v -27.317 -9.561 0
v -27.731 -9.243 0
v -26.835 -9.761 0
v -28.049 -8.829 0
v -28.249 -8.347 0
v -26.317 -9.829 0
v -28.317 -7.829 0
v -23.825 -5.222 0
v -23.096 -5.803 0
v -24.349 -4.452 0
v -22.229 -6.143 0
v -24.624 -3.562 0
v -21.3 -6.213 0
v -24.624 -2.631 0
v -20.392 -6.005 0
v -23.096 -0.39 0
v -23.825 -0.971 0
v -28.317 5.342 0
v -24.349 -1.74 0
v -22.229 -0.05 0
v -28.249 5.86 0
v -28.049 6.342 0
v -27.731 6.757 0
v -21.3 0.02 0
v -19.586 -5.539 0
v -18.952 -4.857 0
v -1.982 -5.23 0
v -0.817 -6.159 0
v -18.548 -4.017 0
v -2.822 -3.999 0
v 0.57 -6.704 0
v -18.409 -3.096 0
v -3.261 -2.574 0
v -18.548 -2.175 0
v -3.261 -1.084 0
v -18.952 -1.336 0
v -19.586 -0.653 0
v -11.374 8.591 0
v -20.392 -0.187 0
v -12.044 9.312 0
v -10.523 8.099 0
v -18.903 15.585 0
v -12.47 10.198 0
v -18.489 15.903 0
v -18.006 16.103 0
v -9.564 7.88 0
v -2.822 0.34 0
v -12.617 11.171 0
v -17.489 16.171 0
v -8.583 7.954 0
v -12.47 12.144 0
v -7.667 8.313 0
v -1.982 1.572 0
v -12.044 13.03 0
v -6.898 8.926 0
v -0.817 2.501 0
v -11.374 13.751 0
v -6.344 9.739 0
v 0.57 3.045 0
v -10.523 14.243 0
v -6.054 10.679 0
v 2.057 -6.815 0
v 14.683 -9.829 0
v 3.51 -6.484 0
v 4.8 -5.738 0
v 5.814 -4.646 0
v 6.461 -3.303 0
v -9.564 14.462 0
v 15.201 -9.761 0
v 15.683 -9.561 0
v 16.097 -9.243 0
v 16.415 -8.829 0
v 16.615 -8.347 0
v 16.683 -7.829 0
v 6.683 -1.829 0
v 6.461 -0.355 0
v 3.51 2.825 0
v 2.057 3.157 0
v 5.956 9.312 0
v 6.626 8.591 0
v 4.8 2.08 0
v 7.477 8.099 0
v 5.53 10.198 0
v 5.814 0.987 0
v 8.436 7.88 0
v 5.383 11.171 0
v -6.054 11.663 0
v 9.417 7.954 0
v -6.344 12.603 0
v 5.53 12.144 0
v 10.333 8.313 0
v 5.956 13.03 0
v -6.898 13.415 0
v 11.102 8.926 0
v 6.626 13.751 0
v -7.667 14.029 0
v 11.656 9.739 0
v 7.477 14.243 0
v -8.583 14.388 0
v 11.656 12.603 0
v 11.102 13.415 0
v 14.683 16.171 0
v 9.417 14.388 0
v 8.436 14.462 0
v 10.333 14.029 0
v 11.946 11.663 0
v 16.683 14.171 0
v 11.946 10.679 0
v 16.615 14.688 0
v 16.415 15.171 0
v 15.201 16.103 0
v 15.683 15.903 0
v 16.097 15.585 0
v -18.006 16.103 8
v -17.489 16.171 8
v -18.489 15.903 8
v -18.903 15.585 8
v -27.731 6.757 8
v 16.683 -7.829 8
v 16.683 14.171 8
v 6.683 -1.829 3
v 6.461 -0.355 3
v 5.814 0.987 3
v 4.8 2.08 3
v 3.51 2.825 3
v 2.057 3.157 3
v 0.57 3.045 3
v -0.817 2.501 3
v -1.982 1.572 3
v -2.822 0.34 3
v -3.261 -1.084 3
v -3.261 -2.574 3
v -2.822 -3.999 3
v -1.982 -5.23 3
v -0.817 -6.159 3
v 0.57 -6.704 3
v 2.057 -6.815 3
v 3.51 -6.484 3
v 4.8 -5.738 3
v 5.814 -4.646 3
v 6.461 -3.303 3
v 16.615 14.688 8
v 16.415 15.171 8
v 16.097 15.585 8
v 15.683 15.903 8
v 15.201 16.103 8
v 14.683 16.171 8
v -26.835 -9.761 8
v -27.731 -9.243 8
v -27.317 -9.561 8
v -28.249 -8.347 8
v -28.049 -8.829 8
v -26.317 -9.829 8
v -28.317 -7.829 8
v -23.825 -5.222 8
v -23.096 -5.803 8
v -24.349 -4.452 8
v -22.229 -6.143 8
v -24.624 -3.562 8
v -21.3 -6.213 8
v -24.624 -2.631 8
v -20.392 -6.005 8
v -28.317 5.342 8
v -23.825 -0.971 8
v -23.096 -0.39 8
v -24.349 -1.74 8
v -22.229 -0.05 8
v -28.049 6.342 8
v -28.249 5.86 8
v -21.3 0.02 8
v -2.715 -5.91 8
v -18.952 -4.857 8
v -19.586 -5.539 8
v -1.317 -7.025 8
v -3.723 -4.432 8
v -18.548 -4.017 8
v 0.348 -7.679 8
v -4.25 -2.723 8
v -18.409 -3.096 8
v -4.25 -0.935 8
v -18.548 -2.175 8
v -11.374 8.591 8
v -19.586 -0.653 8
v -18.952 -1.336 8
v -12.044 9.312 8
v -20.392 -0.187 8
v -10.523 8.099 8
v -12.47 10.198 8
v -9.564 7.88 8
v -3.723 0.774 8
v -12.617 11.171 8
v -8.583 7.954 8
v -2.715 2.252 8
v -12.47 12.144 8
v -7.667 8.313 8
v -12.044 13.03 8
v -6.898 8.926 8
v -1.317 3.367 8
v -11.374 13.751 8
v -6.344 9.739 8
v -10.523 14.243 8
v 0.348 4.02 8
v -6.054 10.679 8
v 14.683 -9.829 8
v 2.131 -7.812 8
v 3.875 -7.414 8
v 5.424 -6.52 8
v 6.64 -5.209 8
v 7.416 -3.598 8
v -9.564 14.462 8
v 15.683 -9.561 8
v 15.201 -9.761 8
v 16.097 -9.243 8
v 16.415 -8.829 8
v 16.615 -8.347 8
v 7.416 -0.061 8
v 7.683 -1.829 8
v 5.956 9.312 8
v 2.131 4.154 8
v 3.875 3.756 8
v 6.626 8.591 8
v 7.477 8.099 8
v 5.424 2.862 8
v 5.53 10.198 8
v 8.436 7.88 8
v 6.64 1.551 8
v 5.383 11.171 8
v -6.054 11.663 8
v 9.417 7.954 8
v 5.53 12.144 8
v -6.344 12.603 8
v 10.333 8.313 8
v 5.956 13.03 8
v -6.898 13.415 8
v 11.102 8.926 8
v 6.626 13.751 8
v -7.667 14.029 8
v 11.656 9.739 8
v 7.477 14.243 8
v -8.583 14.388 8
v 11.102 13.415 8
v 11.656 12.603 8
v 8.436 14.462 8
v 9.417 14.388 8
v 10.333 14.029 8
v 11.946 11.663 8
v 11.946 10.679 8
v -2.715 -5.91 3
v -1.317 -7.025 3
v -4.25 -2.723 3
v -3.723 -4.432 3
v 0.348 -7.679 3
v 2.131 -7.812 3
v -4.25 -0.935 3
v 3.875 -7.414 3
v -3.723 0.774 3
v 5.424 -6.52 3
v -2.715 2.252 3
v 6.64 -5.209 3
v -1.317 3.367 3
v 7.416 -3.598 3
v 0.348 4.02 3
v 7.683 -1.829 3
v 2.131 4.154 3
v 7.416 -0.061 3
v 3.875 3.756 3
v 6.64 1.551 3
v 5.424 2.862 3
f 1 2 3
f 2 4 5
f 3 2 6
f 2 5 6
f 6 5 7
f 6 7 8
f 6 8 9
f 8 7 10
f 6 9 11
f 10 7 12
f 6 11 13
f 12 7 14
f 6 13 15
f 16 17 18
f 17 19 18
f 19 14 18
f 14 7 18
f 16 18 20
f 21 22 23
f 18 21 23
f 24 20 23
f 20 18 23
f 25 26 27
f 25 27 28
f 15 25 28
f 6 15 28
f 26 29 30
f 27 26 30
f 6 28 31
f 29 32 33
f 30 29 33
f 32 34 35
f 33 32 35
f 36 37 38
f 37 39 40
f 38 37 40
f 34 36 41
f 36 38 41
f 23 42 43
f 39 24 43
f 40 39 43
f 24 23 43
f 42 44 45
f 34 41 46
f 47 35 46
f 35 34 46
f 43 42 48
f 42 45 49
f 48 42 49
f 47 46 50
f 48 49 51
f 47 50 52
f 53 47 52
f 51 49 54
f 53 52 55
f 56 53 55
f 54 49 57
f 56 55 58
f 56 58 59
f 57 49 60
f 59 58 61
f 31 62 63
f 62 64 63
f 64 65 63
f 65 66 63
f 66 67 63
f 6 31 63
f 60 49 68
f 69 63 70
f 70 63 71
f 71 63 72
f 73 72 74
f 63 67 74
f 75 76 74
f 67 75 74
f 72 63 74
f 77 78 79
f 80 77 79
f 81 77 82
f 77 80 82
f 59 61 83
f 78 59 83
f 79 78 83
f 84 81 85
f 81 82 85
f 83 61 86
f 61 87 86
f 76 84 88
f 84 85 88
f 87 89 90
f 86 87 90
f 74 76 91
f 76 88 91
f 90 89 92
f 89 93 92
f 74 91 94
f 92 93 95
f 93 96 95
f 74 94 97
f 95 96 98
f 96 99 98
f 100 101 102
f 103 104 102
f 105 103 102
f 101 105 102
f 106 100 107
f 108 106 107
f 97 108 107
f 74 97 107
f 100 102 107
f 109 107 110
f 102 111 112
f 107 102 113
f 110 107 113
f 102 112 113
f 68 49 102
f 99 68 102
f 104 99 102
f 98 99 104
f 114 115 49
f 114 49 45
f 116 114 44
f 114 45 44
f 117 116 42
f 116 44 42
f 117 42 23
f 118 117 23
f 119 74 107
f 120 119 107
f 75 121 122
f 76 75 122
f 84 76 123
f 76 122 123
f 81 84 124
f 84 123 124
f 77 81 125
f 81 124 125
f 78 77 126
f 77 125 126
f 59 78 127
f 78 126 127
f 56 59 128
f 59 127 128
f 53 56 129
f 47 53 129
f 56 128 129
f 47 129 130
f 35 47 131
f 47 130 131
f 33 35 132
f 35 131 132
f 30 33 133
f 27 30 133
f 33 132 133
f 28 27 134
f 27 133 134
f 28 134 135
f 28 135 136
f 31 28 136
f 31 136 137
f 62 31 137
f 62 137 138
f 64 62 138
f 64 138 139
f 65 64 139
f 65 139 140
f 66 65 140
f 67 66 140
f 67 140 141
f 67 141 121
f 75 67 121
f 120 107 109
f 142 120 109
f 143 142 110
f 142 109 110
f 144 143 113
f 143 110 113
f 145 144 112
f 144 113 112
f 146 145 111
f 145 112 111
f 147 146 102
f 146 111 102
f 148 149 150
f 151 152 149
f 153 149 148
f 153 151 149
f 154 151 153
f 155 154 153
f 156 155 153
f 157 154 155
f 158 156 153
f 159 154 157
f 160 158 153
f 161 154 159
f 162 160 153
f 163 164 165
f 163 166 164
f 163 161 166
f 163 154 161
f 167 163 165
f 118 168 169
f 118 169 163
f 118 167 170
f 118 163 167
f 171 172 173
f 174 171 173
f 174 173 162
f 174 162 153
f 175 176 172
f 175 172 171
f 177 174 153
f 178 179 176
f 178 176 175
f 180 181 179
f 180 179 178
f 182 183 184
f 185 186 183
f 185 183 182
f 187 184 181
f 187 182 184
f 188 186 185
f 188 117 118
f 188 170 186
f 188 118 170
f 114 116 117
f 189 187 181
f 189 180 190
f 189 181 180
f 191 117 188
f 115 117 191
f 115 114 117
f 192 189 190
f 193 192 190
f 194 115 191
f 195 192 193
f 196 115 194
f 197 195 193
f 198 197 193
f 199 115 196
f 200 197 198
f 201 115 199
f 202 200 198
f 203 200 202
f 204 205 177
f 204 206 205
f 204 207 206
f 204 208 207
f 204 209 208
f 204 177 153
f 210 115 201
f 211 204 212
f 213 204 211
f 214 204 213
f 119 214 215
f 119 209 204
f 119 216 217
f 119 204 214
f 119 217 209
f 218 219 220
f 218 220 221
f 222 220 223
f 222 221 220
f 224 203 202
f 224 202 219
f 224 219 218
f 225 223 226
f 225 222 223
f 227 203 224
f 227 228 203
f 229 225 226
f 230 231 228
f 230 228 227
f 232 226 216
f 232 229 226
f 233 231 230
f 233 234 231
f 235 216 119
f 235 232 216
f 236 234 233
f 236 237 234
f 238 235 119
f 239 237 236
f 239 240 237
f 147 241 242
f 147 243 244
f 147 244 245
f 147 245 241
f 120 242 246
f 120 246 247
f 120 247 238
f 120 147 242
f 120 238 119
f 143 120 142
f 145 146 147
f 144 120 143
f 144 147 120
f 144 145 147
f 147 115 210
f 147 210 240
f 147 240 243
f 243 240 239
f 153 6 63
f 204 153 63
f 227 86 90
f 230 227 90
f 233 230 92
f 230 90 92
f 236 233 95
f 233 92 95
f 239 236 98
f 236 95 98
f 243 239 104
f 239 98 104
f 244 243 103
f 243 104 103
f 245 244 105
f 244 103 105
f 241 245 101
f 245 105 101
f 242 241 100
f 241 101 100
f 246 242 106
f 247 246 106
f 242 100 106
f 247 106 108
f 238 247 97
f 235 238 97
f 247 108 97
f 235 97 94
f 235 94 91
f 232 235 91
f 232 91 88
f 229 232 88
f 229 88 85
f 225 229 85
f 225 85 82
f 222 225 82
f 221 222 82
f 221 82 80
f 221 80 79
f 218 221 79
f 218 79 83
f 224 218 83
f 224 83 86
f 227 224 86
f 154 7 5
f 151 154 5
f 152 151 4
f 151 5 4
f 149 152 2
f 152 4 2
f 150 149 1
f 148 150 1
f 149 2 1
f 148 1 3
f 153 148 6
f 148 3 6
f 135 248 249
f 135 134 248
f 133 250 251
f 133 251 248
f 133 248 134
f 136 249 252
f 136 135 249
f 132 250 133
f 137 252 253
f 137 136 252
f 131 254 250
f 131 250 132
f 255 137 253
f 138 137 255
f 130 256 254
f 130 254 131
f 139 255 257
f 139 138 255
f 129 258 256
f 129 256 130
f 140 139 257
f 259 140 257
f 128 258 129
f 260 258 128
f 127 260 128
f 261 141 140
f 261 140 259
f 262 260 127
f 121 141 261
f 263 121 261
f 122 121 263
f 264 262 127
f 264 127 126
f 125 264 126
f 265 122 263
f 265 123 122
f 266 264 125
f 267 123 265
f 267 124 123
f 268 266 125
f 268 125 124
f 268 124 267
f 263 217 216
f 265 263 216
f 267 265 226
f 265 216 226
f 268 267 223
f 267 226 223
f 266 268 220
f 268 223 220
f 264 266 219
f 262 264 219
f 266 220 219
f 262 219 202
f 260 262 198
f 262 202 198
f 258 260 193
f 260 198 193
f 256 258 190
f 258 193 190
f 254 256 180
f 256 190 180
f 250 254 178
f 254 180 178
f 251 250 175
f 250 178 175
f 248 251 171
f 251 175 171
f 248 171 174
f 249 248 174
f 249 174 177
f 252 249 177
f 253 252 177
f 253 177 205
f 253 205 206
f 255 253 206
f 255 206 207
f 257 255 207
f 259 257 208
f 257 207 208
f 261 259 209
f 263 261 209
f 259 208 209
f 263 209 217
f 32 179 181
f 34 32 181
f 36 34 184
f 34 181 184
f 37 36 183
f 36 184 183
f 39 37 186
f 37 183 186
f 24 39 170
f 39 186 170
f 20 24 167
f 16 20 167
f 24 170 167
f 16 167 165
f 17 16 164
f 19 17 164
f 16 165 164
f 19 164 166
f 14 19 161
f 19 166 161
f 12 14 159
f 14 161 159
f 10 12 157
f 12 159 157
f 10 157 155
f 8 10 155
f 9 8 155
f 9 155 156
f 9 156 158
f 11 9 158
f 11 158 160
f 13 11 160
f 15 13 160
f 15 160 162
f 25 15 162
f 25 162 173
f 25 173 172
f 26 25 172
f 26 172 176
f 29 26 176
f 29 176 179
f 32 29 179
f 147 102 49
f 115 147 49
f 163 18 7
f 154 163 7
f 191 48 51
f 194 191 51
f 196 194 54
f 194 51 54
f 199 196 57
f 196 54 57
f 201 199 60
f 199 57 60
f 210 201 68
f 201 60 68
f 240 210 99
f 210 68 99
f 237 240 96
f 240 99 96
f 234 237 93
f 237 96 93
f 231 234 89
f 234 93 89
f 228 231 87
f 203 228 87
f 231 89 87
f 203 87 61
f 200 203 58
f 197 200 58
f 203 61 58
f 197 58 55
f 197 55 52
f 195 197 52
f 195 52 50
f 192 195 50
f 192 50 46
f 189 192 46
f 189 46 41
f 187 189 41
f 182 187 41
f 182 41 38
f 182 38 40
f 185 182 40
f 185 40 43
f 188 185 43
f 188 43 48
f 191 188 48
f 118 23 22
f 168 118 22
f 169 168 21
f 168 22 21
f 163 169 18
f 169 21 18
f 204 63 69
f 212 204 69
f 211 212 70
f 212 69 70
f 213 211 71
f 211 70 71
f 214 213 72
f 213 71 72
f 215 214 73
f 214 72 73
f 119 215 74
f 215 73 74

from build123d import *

# Parameters (mm, degrees)
F1_DEPTH = 8
F2_R     = 5
F3_DEPTH = 8.001
F4_R     = 6
F5_DEPTH = 5
F7_D     = 6.6
F8_R     = 3.125
F9_DEPTH = 8.001


with BuildPart() as f1:
    # F0 (on Top) → F1 (new body)
    with BuildSketch(Plane.XY):
        with BuildLine():
            ThreePointArc((-28.3169756085, -7.8291564448), (-27.7311891708, -9.2433700072), (-26.3169756085, -9.8291564448))
            Line((-26.3169756085, -9.8291564448), (14.6830243915, -9.8291564448))
            ThreePointArc((14.6830243915, -9.8291564448), (16.0972379539, -9.2433700072), (16.6830243915, -7.8291564448))
            Line((16.6830243915, -7.8291564448), (16.6830243915, 14.1708435552))
            ThreePointArc((16.6830243915, 14.1708435552), (16.0972379539, 15.5850571176), (14.6830243915, 16.1708435552))
            Line((14.6830243915, 16.1708435552), (-17.4885484837, 16.1708435552))
            ThreePointArc((-17.4885484837, 16.1708435552), (-18.2539153485, 16.0186026202), (-18.9027620461, 15.5850571176))
            Line((-18.9027620461, 15.5850571176), (-27.7311891708, 6.7566299928))
            ThreePointArc((-27.7311891708, 6.7566299928), (-28.1647346735, 6.1077832952), (-28.3169756085, 5.3424164305))
            Line((-28.3169756085, 5.3424164305), (-28.3169756085, -7.8291564448))
        make_face()
    extrude(amount=F1_DEPTH)

    # F2 (on face) → F3 (cut, through all)
    with BuildSketch(Plane.XY.offset(8)):
        with Locations((1.6830243915, -1.8291564448)):
            Circle(F2_R)
    extrude(amount=-F3_DEPTH, mode=Mode.SUBTRACT)

    # F4 (on face) → F5 (cut)
    with BuildSketch(Plane.XY.offset(8)):
        with Locations((1.6830243915, -1.8291564448)):
            Circle(F4_R)
    extrude(amount=-F5_DEPTH, mode=Mode.SUBTRACT)

    # F7 (through all)
    with Locations(Plane.XY.offset(8)):
        with Locations((-9.3169756085, 11.1708435552), (8.6830243915, 11.1708435552)):
            Hole(F7_D / 2)

    # F8 (on face) → F9 (cut, through all)
    with BuildSketch(Plane.XY.offset(8)):
        with Locations((-21.5339642018, -3.0962659512)):
            Circle(F8_R)
    extrude(amount=-F9_DEPTH, mode=Mode.SUBTRACT)


solid = f1.part
